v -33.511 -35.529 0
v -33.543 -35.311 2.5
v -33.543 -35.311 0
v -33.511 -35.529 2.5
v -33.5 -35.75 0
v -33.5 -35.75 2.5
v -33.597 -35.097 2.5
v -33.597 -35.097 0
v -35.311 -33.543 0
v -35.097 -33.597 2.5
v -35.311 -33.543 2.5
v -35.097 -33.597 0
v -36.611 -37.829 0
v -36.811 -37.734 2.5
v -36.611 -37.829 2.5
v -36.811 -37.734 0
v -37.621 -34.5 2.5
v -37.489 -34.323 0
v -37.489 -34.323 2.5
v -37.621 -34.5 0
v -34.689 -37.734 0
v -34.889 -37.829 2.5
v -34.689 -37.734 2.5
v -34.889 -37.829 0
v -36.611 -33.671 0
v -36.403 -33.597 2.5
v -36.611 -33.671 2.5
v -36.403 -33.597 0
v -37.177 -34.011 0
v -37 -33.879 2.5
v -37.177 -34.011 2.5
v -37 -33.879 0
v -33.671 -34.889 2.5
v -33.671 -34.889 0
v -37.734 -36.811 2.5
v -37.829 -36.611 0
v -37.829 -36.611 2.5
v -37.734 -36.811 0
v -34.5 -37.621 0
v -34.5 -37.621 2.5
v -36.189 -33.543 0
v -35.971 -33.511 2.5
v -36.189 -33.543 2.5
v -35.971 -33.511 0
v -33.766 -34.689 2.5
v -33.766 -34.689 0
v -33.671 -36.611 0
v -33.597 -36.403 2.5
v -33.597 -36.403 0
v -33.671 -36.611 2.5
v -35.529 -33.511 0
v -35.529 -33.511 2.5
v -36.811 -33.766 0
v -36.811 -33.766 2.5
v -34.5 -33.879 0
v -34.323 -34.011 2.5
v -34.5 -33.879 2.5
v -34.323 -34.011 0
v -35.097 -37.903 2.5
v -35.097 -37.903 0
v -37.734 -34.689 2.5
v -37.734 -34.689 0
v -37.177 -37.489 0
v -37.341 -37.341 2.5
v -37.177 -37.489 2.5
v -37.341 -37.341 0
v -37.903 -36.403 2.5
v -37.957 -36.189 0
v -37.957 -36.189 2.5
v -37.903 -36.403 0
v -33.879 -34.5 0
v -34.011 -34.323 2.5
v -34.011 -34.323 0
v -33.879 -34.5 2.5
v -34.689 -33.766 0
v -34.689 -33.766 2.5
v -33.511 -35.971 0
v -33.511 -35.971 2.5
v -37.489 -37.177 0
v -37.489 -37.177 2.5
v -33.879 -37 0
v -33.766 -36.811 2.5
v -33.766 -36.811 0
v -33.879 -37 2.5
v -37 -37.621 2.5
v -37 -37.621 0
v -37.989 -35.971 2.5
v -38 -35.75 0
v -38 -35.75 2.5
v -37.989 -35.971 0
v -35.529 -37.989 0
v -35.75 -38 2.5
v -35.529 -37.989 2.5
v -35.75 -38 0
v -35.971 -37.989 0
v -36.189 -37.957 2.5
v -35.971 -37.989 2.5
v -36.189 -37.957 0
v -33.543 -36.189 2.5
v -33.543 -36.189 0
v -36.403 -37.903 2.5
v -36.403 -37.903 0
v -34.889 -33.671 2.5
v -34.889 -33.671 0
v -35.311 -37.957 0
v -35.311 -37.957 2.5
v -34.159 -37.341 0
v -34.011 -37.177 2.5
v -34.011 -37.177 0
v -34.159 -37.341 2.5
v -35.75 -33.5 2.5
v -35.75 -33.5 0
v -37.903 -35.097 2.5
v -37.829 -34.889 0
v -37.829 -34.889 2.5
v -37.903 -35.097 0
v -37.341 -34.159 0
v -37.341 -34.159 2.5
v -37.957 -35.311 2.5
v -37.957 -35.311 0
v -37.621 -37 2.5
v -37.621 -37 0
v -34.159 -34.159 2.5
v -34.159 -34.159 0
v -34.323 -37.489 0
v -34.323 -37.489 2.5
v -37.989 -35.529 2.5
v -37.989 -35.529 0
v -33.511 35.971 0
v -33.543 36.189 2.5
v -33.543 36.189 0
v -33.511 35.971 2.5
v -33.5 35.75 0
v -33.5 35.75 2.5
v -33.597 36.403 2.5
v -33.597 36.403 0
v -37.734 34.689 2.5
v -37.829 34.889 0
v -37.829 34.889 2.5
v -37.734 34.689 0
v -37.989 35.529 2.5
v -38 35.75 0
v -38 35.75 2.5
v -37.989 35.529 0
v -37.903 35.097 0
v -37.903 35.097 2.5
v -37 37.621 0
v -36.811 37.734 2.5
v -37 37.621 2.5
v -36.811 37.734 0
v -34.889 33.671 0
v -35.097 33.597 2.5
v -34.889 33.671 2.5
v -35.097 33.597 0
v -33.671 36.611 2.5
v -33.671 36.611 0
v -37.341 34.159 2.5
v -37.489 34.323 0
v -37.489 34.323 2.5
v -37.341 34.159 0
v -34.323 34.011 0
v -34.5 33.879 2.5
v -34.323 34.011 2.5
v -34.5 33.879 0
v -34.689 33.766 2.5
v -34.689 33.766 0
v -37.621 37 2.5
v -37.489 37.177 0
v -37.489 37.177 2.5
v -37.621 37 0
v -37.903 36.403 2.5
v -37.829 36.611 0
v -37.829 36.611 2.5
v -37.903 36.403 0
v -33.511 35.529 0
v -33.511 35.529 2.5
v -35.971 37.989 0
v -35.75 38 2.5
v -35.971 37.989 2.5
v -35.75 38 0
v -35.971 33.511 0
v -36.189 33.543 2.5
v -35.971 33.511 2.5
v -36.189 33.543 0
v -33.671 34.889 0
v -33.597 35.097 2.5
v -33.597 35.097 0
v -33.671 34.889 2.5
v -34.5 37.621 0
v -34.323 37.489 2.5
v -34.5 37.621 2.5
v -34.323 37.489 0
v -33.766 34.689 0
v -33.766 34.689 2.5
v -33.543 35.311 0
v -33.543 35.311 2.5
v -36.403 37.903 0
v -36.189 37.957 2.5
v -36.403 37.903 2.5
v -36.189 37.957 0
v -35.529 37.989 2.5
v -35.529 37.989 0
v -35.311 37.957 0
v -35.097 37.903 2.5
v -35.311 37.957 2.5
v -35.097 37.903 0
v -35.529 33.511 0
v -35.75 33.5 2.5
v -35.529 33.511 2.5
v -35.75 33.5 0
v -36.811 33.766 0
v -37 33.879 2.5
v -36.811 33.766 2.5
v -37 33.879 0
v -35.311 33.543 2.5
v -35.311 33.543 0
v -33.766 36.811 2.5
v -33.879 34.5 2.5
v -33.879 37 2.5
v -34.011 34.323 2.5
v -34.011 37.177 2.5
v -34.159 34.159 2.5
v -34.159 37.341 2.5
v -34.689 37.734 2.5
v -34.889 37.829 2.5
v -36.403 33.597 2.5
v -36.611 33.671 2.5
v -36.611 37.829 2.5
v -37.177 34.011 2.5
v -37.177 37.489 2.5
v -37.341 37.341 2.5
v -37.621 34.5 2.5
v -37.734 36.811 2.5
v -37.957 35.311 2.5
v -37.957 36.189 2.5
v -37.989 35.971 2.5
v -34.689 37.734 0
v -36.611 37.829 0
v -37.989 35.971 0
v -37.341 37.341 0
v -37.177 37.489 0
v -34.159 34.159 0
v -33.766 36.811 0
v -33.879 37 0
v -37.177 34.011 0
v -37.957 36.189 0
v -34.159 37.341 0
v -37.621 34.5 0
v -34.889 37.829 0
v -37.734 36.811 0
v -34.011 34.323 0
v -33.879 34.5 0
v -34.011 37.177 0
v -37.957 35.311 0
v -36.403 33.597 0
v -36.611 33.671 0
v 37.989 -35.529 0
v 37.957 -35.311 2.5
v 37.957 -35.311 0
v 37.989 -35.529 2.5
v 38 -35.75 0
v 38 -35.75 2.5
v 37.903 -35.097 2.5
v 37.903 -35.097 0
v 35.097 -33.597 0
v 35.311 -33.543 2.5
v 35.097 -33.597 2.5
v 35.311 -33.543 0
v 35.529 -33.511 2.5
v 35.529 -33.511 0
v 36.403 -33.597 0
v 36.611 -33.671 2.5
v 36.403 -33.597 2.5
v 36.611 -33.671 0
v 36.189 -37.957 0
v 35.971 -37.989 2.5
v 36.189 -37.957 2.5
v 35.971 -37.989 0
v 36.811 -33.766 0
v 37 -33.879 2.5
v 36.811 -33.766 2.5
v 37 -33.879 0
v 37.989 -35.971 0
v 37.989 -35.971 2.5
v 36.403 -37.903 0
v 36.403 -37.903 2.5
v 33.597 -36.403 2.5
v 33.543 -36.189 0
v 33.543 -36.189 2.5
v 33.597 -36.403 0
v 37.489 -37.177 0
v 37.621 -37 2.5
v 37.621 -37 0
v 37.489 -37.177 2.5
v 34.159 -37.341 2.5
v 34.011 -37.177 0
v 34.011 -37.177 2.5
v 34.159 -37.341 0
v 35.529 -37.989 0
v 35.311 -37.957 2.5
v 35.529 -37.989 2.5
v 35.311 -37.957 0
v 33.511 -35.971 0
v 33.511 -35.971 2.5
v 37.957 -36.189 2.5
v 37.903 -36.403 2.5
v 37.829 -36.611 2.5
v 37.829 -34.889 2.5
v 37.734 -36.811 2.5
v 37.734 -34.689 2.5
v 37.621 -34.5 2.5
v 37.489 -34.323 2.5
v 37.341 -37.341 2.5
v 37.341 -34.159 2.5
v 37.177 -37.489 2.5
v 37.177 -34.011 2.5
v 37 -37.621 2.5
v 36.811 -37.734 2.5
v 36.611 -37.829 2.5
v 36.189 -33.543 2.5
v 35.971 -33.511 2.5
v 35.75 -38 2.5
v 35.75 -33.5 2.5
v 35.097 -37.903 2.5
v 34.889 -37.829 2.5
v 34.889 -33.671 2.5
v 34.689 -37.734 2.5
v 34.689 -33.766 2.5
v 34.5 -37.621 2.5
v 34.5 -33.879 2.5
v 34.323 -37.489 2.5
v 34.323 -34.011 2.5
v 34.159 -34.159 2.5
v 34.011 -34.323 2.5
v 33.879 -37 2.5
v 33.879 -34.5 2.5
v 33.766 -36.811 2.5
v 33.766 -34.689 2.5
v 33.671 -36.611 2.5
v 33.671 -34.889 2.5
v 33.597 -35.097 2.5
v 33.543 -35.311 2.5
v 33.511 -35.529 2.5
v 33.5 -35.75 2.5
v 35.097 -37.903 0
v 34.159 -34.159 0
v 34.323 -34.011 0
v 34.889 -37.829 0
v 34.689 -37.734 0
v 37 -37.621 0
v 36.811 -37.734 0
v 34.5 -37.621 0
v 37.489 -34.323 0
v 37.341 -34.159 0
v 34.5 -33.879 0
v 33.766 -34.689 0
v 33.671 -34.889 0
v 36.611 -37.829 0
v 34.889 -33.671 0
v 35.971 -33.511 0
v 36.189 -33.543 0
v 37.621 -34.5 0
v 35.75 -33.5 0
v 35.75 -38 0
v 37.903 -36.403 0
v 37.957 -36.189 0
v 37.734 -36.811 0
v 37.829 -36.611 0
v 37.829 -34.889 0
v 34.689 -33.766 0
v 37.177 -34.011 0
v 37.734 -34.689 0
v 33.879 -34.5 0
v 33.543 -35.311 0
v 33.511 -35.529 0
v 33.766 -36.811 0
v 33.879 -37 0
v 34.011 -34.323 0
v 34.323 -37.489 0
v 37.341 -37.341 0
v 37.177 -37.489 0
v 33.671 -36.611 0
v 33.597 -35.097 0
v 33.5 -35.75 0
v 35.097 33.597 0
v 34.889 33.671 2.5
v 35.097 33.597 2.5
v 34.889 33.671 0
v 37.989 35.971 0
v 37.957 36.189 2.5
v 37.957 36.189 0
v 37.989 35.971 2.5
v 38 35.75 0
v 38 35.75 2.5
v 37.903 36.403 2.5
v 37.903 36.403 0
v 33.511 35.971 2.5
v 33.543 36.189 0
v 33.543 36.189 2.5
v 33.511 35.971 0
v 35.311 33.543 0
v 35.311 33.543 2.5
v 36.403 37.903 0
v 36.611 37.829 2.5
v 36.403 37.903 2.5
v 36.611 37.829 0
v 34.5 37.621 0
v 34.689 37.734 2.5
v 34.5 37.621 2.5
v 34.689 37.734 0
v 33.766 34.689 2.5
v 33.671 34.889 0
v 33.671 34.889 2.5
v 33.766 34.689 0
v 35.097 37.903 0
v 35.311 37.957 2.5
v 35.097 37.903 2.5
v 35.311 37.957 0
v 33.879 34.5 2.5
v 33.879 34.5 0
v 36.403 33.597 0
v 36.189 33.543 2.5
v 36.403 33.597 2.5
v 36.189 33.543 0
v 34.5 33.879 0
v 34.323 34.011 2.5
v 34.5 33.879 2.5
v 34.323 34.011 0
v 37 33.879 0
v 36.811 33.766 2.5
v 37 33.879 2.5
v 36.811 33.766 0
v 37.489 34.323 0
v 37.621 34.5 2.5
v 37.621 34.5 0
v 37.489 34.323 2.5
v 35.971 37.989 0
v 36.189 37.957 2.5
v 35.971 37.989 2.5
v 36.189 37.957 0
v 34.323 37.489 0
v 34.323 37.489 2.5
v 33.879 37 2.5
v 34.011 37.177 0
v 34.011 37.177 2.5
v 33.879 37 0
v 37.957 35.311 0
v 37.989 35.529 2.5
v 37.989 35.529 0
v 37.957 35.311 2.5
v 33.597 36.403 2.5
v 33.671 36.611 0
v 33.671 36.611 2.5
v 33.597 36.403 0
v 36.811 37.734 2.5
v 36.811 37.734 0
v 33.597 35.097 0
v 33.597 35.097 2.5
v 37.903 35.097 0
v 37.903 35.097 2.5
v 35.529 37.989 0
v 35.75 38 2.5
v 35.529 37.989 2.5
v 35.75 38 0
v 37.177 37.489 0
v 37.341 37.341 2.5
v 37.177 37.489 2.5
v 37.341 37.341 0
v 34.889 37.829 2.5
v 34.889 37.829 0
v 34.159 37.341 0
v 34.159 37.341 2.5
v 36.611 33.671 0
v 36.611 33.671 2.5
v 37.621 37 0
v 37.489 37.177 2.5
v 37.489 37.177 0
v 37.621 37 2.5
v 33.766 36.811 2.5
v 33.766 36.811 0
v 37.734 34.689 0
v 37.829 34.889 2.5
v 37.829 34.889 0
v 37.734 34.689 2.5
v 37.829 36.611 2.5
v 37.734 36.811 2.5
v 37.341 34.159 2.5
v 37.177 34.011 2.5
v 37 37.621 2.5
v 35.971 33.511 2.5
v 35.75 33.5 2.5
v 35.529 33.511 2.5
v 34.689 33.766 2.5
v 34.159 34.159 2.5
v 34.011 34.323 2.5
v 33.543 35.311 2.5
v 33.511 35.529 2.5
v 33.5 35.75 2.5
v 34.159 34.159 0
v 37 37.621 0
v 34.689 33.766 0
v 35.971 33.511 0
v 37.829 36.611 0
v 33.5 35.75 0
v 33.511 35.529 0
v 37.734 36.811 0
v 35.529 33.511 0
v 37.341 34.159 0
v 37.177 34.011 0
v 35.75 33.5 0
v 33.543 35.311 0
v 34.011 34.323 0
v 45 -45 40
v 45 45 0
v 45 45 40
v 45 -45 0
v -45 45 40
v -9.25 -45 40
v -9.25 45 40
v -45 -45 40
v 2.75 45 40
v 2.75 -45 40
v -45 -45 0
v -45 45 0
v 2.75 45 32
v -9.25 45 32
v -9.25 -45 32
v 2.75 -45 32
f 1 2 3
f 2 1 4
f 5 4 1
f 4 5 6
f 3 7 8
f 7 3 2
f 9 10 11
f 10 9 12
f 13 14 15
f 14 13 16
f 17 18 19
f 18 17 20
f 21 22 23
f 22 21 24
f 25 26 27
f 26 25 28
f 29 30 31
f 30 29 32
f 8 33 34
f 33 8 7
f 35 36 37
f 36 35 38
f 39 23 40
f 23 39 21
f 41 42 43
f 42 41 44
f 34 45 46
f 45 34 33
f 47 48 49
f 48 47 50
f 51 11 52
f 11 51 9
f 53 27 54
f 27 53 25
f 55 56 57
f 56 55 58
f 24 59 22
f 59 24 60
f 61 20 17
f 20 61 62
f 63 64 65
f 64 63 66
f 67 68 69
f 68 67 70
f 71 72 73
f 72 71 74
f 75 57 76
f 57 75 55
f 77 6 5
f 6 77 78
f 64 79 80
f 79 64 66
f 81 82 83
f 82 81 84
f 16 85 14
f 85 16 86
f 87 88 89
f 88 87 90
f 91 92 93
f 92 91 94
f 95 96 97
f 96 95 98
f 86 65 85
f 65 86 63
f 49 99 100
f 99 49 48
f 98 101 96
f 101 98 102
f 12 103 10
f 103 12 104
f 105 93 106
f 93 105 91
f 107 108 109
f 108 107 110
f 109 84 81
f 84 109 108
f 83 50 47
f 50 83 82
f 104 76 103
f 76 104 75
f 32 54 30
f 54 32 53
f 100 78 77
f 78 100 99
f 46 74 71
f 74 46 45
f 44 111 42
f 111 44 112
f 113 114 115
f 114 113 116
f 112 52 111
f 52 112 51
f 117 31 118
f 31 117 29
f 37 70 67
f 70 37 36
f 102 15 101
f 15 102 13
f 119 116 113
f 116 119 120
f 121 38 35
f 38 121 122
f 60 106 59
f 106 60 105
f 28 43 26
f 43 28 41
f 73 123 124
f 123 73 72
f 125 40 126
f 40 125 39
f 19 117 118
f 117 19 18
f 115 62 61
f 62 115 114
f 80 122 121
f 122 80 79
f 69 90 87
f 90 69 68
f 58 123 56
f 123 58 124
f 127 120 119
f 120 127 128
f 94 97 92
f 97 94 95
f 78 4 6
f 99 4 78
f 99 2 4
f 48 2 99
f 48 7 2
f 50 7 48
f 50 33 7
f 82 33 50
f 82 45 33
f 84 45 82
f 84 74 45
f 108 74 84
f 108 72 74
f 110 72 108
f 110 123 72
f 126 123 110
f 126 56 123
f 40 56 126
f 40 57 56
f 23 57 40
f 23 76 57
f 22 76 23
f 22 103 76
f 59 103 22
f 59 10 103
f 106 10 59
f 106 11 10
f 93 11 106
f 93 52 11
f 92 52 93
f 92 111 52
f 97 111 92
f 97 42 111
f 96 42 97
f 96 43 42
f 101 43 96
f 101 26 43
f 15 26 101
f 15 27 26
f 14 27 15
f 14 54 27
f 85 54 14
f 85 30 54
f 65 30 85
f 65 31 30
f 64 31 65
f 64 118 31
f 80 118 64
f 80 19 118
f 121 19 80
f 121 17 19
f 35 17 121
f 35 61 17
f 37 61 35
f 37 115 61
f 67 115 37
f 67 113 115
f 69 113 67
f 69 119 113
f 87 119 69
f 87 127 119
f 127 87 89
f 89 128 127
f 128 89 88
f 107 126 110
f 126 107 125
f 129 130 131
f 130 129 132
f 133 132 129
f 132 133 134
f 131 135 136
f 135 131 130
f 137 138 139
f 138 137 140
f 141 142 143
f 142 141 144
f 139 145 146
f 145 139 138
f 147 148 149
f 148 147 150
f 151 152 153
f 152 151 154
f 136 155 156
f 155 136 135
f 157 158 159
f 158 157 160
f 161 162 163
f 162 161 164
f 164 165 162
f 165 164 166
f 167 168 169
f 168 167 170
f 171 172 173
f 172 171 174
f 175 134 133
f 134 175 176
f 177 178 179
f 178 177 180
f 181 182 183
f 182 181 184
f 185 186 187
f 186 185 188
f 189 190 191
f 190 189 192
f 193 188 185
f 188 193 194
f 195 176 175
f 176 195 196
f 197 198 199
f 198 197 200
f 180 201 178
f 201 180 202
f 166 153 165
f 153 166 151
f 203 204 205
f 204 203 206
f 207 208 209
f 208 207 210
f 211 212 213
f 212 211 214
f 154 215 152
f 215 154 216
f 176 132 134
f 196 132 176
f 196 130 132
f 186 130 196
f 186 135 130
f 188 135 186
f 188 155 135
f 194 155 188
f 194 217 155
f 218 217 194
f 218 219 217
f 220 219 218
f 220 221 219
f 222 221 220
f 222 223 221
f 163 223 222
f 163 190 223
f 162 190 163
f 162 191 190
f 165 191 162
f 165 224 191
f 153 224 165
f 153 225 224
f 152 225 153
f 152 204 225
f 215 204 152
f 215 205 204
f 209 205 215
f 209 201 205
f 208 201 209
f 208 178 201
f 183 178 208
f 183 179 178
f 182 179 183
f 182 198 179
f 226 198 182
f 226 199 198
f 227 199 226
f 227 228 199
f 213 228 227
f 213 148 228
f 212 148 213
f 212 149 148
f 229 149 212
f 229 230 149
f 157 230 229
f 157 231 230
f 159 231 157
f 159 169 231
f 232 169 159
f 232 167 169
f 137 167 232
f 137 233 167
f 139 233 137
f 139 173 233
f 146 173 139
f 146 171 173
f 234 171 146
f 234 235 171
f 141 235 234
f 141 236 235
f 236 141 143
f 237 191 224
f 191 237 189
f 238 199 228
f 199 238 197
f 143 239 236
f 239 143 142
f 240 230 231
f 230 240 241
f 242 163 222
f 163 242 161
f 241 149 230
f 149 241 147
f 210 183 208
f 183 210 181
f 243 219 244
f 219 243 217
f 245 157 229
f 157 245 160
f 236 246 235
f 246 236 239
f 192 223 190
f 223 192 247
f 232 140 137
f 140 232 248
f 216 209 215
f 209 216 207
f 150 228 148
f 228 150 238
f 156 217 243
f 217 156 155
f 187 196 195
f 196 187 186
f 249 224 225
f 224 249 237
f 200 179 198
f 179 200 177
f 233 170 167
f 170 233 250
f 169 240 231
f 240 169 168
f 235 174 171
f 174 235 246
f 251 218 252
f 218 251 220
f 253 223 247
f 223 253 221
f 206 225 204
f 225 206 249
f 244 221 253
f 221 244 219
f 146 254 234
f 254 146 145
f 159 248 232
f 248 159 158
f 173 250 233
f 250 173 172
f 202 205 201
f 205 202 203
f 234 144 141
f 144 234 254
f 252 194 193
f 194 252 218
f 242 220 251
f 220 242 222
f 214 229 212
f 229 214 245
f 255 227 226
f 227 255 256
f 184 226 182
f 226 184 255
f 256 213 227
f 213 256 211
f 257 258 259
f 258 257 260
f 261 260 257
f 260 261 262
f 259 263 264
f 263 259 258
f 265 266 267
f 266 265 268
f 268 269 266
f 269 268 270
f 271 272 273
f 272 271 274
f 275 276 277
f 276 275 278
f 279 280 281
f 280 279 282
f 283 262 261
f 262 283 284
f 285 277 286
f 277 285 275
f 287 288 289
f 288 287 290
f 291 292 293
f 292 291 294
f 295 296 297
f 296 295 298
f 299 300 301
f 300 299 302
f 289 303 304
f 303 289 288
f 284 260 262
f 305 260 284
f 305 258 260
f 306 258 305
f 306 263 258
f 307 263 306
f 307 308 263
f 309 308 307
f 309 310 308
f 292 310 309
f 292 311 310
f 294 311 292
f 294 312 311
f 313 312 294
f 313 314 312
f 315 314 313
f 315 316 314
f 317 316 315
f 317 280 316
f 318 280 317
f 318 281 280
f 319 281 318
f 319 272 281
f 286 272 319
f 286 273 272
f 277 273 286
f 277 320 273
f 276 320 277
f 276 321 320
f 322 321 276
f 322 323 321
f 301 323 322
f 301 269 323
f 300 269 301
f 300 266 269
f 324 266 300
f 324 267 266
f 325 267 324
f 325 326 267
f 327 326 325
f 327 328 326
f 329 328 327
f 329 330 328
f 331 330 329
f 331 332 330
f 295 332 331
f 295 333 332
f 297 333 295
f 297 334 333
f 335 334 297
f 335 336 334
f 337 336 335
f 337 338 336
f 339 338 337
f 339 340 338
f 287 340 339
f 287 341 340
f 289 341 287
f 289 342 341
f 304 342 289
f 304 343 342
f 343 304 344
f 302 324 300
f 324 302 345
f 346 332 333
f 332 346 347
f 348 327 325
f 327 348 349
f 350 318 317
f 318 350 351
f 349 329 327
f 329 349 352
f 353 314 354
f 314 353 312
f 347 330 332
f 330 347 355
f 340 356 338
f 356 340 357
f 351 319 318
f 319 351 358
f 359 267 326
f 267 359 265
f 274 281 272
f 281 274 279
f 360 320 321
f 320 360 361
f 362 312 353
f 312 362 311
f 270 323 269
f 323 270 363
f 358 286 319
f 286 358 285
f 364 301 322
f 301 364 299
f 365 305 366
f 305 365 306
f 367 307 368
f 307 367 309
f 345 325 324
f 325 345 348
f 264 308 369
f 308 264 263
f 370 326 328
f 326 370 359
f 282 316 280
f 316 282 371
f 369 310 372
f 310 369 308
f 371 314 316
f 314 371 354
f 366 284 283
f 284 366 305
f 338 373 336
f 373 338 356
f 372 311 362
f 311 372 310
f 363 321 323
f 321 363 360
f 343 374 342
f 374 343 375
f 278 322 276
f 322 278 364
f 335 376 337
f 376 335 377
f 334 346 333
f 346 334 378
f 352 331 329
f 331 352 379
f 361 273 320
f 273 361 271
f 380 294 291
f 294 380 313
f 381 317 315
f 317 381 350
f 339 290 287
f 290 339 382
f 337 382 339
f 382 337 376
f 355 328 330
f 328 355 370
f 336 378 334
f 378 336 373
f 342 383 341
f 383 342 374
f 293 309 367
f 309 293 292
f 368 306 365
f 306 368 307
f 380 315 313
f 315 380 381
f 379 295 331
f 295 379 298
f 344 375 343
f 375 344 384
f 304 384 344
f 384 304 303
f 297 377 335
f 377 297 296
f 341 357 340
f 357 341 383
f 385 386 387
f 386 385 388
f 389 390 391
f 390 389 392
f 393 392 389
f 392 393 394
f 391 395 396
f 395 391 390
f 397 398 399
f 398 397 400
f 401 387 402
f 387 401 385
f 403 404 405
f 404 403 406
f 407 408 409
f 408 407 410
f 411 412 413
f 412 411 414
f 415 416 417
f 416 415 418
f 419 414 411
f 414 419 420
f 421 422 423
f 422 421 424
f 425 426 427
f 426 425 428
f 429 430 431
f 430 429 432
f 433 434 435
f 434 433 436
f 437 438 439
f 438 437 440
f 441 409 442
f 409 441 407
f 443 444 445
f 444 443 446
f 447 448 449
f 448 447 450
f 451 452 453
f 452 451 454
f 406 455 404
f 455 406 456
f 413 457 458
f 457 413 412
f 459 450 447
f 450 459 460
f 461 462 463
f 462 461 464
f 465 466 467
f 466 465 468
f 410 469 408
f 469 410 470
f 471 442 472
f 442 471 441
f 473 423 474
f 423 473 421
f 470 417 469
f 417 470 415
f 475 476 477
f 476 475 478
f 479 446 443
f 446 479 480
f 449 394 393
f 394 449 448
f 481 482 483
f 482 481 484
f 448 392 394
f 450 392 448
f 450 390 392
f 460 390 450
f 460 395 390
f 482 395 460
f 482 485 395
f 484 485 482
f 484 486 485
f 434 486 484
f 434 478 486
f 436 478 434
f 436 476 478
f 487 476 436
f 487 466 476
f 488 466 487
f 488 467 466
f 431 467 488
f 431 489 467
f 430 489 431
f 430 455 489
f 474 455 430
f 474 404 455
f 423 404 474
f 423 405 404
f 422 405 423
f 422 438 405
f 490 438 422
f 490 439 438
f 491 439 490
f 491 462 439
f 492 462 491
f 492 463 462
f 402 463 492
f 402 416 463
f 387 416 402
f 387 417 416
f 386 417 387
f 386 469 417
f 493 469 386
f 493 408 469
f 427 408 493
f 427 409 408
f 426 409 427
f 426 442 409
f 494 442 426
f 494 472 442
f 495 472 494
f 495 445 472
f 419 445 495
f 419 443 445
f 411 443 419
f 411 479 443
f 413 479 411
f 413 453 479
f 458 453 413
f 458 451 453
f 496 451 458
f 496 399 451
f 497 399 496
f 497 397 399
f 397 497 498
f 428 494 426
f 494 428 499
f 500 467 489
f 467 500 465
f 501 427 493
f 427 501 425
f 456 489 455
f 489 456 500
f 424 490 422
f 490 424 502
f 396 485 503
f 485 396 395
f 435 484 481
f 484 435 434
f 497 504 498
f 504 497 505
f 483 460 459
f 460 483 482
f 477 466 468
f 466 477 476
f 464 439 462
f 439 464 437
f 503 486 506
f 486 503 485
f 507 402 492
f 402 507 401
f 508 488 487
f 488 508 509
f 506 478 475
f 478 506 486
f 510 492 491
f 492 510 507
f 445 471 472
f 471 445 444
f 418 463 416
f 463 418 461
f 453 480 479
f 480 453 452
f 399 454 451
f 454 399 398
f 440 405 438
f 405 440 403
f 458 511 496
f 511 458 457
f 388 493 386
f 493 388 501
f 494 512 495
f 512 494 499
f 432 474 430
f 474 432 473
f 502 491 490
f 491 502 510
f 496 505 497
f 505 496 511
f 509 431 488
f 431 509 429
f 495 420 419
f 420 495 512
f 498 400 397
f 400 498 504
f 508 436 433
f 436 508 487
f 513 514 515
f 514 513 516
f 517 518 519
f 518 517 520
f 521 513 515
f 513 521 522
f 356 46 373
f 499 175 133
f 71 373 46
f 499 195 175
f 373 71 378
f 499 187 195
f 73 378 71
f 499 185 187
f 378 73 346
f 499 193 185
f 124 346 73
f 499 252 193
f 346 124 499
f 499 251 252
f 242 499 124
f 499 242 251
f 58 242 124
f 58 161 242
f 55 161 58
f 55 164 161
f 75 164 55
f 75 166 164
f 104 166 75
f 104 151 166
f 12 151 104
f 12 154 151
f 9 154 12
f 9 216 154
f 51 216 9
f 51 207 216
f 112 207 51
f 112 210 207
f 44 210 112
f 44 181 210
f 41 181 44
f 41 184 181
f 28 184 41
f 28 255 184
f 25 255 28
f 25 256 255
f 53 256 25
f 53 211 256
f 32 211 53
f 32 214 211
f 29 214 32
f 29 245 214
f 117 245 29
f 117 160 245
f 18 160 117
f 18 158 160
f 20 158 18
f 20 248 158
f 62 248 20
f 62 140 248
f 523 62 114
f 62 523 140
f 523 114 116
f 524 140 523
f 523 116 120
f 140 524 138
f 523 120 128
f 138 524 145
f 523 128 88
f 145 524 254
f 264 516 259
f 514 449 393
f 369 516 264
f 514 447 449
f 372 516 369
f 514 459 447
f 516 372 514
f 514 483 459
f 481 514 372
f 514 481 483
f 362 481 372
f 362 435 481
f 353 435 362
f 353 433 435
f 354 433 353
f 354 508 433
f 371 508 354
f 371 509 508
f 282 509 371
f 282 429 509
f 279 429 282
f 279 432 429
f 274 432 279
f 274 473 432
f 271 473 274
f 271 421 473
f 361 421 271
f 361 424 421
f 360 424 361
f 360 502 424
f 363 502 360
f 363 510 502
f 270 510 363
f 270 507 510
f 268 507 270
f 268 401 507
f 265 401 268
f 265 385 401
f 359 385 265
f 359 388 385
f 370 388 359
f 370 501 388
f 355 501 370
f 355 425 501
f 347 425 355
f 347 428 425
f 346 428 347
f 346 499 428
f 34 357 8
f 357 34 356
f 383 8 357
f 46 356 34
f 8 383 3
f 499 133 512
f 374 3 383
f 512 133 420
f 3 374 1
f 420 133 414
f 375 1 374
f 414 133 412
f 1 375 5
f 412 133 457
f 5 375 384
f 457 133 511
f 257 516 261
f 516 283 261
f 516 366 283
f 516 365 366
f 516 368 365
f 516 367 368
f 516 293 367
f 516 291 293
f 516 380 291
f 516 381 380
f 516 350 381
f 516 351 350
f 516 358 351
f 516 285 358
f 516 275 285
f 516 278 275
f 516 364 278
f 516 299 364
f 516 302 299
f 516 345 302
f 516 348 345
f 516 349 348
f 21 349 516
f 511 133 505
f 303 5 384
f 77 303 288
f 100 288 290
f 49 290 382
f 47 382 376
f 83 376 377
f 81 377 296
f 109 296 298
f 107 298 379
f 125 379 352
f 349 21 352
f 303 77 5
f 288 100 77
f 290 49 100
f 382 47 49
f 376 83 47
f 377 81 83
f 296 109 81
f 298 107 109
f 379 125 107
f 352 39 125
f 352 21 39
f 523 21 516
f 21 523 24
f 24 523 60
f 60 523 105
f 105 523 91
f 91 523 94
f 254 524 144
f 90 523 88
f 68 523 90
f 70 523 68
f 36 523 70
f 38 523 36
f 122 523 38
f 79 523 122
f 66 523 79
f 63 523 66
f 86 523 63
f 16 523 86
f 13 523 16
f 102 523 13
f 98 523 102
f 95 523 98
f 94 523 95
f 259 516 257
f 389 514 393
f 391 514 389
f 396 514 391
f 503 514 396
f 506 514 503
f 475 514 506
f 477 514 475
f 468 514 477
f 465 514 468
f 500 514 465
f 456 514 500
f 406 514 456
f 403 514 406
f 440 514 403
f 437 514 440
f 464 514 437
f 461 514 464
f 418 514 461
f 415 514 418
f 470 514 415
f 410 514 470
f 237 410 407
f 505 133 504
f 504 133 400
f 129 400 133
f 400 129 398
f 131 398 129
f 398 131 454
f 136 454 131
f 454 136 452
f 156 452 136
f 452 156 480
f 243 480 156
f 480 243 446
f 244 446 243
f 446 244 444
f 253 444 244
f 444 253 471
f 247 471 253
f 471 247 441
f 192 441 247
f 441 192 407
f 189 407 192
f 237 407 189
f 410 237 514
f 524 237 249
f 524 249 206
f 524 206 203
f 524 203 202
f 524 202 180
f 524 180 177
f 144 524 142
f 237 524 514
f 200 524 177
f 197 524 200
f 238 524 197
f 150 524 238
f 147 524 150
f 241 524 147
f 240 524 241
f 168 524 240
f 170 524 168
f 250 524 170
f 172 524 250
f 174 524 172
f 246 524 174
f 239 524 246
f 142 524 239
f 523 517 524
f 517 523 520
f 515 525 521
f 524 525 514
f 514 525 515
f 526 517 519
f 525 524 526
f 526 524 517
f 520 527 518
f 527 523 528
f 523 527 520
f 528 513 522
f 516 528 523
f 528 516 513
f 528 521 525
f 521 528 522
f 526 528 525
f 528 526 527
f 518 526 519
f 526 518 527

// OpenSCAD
// Magnetic stirrer housing - upside-down open box over 80 mm PC fan
// Print orientation: top plate on bed (z = 0), walls rise to open top (z = 40)

// ---------- Parameters ----------
plate_t      = 2;     // top plate thickness
wall_t       = 2.5;   // wall thickness
box_h        = 40;    // total height of box (open top at z = 40)
outer_x      = 90;    // outer size in X
outer_y      = 90;    // outer size in Y
screw_d      = 4.5;   // M4 screw hole diameter
screw_count  = 4;     // number of screw holes
screw_pitch  = 71.5;  // square pattern side-to-side hole spacing
notch_w      = 12;    // cable notch width
notch_depth  = 8;     // cable notch depth from open edge (z = 32 to z = 40)
eps          = 0.5;   // cutter overshoot past faces

$fn = 64;

// ---------- Model ----------
difference() {
    // Outer block
    translate([-outer_x / 2, -outer_y / 2, 0])
        cube([outer_x, outer_y, box_h]);

    // Screw holes through top plate, centred on plate
    for (i = [0 : screw_count - 1]) {
        for (j = [0 : screw_count - 1]) {
            x = (i - (screw_count - 1) / 2) * screw_pitch;
            y = (j - (screw_count - 1) / 2) * screw_pitch;
            translate([x, y, -eps])
                cylinder(d = screw_d, h = plate_t + 2 * eps);
        }
    }

    // Cable notch in one wall, centred along wall, from z = 32 to z = 40
    translate([-outer_x / 2 + screw_pitch / 2, -outer_y / 2, box_h - notch_depth])
        cube([notch_w, outer_y, notch_depth + eps]);
}
